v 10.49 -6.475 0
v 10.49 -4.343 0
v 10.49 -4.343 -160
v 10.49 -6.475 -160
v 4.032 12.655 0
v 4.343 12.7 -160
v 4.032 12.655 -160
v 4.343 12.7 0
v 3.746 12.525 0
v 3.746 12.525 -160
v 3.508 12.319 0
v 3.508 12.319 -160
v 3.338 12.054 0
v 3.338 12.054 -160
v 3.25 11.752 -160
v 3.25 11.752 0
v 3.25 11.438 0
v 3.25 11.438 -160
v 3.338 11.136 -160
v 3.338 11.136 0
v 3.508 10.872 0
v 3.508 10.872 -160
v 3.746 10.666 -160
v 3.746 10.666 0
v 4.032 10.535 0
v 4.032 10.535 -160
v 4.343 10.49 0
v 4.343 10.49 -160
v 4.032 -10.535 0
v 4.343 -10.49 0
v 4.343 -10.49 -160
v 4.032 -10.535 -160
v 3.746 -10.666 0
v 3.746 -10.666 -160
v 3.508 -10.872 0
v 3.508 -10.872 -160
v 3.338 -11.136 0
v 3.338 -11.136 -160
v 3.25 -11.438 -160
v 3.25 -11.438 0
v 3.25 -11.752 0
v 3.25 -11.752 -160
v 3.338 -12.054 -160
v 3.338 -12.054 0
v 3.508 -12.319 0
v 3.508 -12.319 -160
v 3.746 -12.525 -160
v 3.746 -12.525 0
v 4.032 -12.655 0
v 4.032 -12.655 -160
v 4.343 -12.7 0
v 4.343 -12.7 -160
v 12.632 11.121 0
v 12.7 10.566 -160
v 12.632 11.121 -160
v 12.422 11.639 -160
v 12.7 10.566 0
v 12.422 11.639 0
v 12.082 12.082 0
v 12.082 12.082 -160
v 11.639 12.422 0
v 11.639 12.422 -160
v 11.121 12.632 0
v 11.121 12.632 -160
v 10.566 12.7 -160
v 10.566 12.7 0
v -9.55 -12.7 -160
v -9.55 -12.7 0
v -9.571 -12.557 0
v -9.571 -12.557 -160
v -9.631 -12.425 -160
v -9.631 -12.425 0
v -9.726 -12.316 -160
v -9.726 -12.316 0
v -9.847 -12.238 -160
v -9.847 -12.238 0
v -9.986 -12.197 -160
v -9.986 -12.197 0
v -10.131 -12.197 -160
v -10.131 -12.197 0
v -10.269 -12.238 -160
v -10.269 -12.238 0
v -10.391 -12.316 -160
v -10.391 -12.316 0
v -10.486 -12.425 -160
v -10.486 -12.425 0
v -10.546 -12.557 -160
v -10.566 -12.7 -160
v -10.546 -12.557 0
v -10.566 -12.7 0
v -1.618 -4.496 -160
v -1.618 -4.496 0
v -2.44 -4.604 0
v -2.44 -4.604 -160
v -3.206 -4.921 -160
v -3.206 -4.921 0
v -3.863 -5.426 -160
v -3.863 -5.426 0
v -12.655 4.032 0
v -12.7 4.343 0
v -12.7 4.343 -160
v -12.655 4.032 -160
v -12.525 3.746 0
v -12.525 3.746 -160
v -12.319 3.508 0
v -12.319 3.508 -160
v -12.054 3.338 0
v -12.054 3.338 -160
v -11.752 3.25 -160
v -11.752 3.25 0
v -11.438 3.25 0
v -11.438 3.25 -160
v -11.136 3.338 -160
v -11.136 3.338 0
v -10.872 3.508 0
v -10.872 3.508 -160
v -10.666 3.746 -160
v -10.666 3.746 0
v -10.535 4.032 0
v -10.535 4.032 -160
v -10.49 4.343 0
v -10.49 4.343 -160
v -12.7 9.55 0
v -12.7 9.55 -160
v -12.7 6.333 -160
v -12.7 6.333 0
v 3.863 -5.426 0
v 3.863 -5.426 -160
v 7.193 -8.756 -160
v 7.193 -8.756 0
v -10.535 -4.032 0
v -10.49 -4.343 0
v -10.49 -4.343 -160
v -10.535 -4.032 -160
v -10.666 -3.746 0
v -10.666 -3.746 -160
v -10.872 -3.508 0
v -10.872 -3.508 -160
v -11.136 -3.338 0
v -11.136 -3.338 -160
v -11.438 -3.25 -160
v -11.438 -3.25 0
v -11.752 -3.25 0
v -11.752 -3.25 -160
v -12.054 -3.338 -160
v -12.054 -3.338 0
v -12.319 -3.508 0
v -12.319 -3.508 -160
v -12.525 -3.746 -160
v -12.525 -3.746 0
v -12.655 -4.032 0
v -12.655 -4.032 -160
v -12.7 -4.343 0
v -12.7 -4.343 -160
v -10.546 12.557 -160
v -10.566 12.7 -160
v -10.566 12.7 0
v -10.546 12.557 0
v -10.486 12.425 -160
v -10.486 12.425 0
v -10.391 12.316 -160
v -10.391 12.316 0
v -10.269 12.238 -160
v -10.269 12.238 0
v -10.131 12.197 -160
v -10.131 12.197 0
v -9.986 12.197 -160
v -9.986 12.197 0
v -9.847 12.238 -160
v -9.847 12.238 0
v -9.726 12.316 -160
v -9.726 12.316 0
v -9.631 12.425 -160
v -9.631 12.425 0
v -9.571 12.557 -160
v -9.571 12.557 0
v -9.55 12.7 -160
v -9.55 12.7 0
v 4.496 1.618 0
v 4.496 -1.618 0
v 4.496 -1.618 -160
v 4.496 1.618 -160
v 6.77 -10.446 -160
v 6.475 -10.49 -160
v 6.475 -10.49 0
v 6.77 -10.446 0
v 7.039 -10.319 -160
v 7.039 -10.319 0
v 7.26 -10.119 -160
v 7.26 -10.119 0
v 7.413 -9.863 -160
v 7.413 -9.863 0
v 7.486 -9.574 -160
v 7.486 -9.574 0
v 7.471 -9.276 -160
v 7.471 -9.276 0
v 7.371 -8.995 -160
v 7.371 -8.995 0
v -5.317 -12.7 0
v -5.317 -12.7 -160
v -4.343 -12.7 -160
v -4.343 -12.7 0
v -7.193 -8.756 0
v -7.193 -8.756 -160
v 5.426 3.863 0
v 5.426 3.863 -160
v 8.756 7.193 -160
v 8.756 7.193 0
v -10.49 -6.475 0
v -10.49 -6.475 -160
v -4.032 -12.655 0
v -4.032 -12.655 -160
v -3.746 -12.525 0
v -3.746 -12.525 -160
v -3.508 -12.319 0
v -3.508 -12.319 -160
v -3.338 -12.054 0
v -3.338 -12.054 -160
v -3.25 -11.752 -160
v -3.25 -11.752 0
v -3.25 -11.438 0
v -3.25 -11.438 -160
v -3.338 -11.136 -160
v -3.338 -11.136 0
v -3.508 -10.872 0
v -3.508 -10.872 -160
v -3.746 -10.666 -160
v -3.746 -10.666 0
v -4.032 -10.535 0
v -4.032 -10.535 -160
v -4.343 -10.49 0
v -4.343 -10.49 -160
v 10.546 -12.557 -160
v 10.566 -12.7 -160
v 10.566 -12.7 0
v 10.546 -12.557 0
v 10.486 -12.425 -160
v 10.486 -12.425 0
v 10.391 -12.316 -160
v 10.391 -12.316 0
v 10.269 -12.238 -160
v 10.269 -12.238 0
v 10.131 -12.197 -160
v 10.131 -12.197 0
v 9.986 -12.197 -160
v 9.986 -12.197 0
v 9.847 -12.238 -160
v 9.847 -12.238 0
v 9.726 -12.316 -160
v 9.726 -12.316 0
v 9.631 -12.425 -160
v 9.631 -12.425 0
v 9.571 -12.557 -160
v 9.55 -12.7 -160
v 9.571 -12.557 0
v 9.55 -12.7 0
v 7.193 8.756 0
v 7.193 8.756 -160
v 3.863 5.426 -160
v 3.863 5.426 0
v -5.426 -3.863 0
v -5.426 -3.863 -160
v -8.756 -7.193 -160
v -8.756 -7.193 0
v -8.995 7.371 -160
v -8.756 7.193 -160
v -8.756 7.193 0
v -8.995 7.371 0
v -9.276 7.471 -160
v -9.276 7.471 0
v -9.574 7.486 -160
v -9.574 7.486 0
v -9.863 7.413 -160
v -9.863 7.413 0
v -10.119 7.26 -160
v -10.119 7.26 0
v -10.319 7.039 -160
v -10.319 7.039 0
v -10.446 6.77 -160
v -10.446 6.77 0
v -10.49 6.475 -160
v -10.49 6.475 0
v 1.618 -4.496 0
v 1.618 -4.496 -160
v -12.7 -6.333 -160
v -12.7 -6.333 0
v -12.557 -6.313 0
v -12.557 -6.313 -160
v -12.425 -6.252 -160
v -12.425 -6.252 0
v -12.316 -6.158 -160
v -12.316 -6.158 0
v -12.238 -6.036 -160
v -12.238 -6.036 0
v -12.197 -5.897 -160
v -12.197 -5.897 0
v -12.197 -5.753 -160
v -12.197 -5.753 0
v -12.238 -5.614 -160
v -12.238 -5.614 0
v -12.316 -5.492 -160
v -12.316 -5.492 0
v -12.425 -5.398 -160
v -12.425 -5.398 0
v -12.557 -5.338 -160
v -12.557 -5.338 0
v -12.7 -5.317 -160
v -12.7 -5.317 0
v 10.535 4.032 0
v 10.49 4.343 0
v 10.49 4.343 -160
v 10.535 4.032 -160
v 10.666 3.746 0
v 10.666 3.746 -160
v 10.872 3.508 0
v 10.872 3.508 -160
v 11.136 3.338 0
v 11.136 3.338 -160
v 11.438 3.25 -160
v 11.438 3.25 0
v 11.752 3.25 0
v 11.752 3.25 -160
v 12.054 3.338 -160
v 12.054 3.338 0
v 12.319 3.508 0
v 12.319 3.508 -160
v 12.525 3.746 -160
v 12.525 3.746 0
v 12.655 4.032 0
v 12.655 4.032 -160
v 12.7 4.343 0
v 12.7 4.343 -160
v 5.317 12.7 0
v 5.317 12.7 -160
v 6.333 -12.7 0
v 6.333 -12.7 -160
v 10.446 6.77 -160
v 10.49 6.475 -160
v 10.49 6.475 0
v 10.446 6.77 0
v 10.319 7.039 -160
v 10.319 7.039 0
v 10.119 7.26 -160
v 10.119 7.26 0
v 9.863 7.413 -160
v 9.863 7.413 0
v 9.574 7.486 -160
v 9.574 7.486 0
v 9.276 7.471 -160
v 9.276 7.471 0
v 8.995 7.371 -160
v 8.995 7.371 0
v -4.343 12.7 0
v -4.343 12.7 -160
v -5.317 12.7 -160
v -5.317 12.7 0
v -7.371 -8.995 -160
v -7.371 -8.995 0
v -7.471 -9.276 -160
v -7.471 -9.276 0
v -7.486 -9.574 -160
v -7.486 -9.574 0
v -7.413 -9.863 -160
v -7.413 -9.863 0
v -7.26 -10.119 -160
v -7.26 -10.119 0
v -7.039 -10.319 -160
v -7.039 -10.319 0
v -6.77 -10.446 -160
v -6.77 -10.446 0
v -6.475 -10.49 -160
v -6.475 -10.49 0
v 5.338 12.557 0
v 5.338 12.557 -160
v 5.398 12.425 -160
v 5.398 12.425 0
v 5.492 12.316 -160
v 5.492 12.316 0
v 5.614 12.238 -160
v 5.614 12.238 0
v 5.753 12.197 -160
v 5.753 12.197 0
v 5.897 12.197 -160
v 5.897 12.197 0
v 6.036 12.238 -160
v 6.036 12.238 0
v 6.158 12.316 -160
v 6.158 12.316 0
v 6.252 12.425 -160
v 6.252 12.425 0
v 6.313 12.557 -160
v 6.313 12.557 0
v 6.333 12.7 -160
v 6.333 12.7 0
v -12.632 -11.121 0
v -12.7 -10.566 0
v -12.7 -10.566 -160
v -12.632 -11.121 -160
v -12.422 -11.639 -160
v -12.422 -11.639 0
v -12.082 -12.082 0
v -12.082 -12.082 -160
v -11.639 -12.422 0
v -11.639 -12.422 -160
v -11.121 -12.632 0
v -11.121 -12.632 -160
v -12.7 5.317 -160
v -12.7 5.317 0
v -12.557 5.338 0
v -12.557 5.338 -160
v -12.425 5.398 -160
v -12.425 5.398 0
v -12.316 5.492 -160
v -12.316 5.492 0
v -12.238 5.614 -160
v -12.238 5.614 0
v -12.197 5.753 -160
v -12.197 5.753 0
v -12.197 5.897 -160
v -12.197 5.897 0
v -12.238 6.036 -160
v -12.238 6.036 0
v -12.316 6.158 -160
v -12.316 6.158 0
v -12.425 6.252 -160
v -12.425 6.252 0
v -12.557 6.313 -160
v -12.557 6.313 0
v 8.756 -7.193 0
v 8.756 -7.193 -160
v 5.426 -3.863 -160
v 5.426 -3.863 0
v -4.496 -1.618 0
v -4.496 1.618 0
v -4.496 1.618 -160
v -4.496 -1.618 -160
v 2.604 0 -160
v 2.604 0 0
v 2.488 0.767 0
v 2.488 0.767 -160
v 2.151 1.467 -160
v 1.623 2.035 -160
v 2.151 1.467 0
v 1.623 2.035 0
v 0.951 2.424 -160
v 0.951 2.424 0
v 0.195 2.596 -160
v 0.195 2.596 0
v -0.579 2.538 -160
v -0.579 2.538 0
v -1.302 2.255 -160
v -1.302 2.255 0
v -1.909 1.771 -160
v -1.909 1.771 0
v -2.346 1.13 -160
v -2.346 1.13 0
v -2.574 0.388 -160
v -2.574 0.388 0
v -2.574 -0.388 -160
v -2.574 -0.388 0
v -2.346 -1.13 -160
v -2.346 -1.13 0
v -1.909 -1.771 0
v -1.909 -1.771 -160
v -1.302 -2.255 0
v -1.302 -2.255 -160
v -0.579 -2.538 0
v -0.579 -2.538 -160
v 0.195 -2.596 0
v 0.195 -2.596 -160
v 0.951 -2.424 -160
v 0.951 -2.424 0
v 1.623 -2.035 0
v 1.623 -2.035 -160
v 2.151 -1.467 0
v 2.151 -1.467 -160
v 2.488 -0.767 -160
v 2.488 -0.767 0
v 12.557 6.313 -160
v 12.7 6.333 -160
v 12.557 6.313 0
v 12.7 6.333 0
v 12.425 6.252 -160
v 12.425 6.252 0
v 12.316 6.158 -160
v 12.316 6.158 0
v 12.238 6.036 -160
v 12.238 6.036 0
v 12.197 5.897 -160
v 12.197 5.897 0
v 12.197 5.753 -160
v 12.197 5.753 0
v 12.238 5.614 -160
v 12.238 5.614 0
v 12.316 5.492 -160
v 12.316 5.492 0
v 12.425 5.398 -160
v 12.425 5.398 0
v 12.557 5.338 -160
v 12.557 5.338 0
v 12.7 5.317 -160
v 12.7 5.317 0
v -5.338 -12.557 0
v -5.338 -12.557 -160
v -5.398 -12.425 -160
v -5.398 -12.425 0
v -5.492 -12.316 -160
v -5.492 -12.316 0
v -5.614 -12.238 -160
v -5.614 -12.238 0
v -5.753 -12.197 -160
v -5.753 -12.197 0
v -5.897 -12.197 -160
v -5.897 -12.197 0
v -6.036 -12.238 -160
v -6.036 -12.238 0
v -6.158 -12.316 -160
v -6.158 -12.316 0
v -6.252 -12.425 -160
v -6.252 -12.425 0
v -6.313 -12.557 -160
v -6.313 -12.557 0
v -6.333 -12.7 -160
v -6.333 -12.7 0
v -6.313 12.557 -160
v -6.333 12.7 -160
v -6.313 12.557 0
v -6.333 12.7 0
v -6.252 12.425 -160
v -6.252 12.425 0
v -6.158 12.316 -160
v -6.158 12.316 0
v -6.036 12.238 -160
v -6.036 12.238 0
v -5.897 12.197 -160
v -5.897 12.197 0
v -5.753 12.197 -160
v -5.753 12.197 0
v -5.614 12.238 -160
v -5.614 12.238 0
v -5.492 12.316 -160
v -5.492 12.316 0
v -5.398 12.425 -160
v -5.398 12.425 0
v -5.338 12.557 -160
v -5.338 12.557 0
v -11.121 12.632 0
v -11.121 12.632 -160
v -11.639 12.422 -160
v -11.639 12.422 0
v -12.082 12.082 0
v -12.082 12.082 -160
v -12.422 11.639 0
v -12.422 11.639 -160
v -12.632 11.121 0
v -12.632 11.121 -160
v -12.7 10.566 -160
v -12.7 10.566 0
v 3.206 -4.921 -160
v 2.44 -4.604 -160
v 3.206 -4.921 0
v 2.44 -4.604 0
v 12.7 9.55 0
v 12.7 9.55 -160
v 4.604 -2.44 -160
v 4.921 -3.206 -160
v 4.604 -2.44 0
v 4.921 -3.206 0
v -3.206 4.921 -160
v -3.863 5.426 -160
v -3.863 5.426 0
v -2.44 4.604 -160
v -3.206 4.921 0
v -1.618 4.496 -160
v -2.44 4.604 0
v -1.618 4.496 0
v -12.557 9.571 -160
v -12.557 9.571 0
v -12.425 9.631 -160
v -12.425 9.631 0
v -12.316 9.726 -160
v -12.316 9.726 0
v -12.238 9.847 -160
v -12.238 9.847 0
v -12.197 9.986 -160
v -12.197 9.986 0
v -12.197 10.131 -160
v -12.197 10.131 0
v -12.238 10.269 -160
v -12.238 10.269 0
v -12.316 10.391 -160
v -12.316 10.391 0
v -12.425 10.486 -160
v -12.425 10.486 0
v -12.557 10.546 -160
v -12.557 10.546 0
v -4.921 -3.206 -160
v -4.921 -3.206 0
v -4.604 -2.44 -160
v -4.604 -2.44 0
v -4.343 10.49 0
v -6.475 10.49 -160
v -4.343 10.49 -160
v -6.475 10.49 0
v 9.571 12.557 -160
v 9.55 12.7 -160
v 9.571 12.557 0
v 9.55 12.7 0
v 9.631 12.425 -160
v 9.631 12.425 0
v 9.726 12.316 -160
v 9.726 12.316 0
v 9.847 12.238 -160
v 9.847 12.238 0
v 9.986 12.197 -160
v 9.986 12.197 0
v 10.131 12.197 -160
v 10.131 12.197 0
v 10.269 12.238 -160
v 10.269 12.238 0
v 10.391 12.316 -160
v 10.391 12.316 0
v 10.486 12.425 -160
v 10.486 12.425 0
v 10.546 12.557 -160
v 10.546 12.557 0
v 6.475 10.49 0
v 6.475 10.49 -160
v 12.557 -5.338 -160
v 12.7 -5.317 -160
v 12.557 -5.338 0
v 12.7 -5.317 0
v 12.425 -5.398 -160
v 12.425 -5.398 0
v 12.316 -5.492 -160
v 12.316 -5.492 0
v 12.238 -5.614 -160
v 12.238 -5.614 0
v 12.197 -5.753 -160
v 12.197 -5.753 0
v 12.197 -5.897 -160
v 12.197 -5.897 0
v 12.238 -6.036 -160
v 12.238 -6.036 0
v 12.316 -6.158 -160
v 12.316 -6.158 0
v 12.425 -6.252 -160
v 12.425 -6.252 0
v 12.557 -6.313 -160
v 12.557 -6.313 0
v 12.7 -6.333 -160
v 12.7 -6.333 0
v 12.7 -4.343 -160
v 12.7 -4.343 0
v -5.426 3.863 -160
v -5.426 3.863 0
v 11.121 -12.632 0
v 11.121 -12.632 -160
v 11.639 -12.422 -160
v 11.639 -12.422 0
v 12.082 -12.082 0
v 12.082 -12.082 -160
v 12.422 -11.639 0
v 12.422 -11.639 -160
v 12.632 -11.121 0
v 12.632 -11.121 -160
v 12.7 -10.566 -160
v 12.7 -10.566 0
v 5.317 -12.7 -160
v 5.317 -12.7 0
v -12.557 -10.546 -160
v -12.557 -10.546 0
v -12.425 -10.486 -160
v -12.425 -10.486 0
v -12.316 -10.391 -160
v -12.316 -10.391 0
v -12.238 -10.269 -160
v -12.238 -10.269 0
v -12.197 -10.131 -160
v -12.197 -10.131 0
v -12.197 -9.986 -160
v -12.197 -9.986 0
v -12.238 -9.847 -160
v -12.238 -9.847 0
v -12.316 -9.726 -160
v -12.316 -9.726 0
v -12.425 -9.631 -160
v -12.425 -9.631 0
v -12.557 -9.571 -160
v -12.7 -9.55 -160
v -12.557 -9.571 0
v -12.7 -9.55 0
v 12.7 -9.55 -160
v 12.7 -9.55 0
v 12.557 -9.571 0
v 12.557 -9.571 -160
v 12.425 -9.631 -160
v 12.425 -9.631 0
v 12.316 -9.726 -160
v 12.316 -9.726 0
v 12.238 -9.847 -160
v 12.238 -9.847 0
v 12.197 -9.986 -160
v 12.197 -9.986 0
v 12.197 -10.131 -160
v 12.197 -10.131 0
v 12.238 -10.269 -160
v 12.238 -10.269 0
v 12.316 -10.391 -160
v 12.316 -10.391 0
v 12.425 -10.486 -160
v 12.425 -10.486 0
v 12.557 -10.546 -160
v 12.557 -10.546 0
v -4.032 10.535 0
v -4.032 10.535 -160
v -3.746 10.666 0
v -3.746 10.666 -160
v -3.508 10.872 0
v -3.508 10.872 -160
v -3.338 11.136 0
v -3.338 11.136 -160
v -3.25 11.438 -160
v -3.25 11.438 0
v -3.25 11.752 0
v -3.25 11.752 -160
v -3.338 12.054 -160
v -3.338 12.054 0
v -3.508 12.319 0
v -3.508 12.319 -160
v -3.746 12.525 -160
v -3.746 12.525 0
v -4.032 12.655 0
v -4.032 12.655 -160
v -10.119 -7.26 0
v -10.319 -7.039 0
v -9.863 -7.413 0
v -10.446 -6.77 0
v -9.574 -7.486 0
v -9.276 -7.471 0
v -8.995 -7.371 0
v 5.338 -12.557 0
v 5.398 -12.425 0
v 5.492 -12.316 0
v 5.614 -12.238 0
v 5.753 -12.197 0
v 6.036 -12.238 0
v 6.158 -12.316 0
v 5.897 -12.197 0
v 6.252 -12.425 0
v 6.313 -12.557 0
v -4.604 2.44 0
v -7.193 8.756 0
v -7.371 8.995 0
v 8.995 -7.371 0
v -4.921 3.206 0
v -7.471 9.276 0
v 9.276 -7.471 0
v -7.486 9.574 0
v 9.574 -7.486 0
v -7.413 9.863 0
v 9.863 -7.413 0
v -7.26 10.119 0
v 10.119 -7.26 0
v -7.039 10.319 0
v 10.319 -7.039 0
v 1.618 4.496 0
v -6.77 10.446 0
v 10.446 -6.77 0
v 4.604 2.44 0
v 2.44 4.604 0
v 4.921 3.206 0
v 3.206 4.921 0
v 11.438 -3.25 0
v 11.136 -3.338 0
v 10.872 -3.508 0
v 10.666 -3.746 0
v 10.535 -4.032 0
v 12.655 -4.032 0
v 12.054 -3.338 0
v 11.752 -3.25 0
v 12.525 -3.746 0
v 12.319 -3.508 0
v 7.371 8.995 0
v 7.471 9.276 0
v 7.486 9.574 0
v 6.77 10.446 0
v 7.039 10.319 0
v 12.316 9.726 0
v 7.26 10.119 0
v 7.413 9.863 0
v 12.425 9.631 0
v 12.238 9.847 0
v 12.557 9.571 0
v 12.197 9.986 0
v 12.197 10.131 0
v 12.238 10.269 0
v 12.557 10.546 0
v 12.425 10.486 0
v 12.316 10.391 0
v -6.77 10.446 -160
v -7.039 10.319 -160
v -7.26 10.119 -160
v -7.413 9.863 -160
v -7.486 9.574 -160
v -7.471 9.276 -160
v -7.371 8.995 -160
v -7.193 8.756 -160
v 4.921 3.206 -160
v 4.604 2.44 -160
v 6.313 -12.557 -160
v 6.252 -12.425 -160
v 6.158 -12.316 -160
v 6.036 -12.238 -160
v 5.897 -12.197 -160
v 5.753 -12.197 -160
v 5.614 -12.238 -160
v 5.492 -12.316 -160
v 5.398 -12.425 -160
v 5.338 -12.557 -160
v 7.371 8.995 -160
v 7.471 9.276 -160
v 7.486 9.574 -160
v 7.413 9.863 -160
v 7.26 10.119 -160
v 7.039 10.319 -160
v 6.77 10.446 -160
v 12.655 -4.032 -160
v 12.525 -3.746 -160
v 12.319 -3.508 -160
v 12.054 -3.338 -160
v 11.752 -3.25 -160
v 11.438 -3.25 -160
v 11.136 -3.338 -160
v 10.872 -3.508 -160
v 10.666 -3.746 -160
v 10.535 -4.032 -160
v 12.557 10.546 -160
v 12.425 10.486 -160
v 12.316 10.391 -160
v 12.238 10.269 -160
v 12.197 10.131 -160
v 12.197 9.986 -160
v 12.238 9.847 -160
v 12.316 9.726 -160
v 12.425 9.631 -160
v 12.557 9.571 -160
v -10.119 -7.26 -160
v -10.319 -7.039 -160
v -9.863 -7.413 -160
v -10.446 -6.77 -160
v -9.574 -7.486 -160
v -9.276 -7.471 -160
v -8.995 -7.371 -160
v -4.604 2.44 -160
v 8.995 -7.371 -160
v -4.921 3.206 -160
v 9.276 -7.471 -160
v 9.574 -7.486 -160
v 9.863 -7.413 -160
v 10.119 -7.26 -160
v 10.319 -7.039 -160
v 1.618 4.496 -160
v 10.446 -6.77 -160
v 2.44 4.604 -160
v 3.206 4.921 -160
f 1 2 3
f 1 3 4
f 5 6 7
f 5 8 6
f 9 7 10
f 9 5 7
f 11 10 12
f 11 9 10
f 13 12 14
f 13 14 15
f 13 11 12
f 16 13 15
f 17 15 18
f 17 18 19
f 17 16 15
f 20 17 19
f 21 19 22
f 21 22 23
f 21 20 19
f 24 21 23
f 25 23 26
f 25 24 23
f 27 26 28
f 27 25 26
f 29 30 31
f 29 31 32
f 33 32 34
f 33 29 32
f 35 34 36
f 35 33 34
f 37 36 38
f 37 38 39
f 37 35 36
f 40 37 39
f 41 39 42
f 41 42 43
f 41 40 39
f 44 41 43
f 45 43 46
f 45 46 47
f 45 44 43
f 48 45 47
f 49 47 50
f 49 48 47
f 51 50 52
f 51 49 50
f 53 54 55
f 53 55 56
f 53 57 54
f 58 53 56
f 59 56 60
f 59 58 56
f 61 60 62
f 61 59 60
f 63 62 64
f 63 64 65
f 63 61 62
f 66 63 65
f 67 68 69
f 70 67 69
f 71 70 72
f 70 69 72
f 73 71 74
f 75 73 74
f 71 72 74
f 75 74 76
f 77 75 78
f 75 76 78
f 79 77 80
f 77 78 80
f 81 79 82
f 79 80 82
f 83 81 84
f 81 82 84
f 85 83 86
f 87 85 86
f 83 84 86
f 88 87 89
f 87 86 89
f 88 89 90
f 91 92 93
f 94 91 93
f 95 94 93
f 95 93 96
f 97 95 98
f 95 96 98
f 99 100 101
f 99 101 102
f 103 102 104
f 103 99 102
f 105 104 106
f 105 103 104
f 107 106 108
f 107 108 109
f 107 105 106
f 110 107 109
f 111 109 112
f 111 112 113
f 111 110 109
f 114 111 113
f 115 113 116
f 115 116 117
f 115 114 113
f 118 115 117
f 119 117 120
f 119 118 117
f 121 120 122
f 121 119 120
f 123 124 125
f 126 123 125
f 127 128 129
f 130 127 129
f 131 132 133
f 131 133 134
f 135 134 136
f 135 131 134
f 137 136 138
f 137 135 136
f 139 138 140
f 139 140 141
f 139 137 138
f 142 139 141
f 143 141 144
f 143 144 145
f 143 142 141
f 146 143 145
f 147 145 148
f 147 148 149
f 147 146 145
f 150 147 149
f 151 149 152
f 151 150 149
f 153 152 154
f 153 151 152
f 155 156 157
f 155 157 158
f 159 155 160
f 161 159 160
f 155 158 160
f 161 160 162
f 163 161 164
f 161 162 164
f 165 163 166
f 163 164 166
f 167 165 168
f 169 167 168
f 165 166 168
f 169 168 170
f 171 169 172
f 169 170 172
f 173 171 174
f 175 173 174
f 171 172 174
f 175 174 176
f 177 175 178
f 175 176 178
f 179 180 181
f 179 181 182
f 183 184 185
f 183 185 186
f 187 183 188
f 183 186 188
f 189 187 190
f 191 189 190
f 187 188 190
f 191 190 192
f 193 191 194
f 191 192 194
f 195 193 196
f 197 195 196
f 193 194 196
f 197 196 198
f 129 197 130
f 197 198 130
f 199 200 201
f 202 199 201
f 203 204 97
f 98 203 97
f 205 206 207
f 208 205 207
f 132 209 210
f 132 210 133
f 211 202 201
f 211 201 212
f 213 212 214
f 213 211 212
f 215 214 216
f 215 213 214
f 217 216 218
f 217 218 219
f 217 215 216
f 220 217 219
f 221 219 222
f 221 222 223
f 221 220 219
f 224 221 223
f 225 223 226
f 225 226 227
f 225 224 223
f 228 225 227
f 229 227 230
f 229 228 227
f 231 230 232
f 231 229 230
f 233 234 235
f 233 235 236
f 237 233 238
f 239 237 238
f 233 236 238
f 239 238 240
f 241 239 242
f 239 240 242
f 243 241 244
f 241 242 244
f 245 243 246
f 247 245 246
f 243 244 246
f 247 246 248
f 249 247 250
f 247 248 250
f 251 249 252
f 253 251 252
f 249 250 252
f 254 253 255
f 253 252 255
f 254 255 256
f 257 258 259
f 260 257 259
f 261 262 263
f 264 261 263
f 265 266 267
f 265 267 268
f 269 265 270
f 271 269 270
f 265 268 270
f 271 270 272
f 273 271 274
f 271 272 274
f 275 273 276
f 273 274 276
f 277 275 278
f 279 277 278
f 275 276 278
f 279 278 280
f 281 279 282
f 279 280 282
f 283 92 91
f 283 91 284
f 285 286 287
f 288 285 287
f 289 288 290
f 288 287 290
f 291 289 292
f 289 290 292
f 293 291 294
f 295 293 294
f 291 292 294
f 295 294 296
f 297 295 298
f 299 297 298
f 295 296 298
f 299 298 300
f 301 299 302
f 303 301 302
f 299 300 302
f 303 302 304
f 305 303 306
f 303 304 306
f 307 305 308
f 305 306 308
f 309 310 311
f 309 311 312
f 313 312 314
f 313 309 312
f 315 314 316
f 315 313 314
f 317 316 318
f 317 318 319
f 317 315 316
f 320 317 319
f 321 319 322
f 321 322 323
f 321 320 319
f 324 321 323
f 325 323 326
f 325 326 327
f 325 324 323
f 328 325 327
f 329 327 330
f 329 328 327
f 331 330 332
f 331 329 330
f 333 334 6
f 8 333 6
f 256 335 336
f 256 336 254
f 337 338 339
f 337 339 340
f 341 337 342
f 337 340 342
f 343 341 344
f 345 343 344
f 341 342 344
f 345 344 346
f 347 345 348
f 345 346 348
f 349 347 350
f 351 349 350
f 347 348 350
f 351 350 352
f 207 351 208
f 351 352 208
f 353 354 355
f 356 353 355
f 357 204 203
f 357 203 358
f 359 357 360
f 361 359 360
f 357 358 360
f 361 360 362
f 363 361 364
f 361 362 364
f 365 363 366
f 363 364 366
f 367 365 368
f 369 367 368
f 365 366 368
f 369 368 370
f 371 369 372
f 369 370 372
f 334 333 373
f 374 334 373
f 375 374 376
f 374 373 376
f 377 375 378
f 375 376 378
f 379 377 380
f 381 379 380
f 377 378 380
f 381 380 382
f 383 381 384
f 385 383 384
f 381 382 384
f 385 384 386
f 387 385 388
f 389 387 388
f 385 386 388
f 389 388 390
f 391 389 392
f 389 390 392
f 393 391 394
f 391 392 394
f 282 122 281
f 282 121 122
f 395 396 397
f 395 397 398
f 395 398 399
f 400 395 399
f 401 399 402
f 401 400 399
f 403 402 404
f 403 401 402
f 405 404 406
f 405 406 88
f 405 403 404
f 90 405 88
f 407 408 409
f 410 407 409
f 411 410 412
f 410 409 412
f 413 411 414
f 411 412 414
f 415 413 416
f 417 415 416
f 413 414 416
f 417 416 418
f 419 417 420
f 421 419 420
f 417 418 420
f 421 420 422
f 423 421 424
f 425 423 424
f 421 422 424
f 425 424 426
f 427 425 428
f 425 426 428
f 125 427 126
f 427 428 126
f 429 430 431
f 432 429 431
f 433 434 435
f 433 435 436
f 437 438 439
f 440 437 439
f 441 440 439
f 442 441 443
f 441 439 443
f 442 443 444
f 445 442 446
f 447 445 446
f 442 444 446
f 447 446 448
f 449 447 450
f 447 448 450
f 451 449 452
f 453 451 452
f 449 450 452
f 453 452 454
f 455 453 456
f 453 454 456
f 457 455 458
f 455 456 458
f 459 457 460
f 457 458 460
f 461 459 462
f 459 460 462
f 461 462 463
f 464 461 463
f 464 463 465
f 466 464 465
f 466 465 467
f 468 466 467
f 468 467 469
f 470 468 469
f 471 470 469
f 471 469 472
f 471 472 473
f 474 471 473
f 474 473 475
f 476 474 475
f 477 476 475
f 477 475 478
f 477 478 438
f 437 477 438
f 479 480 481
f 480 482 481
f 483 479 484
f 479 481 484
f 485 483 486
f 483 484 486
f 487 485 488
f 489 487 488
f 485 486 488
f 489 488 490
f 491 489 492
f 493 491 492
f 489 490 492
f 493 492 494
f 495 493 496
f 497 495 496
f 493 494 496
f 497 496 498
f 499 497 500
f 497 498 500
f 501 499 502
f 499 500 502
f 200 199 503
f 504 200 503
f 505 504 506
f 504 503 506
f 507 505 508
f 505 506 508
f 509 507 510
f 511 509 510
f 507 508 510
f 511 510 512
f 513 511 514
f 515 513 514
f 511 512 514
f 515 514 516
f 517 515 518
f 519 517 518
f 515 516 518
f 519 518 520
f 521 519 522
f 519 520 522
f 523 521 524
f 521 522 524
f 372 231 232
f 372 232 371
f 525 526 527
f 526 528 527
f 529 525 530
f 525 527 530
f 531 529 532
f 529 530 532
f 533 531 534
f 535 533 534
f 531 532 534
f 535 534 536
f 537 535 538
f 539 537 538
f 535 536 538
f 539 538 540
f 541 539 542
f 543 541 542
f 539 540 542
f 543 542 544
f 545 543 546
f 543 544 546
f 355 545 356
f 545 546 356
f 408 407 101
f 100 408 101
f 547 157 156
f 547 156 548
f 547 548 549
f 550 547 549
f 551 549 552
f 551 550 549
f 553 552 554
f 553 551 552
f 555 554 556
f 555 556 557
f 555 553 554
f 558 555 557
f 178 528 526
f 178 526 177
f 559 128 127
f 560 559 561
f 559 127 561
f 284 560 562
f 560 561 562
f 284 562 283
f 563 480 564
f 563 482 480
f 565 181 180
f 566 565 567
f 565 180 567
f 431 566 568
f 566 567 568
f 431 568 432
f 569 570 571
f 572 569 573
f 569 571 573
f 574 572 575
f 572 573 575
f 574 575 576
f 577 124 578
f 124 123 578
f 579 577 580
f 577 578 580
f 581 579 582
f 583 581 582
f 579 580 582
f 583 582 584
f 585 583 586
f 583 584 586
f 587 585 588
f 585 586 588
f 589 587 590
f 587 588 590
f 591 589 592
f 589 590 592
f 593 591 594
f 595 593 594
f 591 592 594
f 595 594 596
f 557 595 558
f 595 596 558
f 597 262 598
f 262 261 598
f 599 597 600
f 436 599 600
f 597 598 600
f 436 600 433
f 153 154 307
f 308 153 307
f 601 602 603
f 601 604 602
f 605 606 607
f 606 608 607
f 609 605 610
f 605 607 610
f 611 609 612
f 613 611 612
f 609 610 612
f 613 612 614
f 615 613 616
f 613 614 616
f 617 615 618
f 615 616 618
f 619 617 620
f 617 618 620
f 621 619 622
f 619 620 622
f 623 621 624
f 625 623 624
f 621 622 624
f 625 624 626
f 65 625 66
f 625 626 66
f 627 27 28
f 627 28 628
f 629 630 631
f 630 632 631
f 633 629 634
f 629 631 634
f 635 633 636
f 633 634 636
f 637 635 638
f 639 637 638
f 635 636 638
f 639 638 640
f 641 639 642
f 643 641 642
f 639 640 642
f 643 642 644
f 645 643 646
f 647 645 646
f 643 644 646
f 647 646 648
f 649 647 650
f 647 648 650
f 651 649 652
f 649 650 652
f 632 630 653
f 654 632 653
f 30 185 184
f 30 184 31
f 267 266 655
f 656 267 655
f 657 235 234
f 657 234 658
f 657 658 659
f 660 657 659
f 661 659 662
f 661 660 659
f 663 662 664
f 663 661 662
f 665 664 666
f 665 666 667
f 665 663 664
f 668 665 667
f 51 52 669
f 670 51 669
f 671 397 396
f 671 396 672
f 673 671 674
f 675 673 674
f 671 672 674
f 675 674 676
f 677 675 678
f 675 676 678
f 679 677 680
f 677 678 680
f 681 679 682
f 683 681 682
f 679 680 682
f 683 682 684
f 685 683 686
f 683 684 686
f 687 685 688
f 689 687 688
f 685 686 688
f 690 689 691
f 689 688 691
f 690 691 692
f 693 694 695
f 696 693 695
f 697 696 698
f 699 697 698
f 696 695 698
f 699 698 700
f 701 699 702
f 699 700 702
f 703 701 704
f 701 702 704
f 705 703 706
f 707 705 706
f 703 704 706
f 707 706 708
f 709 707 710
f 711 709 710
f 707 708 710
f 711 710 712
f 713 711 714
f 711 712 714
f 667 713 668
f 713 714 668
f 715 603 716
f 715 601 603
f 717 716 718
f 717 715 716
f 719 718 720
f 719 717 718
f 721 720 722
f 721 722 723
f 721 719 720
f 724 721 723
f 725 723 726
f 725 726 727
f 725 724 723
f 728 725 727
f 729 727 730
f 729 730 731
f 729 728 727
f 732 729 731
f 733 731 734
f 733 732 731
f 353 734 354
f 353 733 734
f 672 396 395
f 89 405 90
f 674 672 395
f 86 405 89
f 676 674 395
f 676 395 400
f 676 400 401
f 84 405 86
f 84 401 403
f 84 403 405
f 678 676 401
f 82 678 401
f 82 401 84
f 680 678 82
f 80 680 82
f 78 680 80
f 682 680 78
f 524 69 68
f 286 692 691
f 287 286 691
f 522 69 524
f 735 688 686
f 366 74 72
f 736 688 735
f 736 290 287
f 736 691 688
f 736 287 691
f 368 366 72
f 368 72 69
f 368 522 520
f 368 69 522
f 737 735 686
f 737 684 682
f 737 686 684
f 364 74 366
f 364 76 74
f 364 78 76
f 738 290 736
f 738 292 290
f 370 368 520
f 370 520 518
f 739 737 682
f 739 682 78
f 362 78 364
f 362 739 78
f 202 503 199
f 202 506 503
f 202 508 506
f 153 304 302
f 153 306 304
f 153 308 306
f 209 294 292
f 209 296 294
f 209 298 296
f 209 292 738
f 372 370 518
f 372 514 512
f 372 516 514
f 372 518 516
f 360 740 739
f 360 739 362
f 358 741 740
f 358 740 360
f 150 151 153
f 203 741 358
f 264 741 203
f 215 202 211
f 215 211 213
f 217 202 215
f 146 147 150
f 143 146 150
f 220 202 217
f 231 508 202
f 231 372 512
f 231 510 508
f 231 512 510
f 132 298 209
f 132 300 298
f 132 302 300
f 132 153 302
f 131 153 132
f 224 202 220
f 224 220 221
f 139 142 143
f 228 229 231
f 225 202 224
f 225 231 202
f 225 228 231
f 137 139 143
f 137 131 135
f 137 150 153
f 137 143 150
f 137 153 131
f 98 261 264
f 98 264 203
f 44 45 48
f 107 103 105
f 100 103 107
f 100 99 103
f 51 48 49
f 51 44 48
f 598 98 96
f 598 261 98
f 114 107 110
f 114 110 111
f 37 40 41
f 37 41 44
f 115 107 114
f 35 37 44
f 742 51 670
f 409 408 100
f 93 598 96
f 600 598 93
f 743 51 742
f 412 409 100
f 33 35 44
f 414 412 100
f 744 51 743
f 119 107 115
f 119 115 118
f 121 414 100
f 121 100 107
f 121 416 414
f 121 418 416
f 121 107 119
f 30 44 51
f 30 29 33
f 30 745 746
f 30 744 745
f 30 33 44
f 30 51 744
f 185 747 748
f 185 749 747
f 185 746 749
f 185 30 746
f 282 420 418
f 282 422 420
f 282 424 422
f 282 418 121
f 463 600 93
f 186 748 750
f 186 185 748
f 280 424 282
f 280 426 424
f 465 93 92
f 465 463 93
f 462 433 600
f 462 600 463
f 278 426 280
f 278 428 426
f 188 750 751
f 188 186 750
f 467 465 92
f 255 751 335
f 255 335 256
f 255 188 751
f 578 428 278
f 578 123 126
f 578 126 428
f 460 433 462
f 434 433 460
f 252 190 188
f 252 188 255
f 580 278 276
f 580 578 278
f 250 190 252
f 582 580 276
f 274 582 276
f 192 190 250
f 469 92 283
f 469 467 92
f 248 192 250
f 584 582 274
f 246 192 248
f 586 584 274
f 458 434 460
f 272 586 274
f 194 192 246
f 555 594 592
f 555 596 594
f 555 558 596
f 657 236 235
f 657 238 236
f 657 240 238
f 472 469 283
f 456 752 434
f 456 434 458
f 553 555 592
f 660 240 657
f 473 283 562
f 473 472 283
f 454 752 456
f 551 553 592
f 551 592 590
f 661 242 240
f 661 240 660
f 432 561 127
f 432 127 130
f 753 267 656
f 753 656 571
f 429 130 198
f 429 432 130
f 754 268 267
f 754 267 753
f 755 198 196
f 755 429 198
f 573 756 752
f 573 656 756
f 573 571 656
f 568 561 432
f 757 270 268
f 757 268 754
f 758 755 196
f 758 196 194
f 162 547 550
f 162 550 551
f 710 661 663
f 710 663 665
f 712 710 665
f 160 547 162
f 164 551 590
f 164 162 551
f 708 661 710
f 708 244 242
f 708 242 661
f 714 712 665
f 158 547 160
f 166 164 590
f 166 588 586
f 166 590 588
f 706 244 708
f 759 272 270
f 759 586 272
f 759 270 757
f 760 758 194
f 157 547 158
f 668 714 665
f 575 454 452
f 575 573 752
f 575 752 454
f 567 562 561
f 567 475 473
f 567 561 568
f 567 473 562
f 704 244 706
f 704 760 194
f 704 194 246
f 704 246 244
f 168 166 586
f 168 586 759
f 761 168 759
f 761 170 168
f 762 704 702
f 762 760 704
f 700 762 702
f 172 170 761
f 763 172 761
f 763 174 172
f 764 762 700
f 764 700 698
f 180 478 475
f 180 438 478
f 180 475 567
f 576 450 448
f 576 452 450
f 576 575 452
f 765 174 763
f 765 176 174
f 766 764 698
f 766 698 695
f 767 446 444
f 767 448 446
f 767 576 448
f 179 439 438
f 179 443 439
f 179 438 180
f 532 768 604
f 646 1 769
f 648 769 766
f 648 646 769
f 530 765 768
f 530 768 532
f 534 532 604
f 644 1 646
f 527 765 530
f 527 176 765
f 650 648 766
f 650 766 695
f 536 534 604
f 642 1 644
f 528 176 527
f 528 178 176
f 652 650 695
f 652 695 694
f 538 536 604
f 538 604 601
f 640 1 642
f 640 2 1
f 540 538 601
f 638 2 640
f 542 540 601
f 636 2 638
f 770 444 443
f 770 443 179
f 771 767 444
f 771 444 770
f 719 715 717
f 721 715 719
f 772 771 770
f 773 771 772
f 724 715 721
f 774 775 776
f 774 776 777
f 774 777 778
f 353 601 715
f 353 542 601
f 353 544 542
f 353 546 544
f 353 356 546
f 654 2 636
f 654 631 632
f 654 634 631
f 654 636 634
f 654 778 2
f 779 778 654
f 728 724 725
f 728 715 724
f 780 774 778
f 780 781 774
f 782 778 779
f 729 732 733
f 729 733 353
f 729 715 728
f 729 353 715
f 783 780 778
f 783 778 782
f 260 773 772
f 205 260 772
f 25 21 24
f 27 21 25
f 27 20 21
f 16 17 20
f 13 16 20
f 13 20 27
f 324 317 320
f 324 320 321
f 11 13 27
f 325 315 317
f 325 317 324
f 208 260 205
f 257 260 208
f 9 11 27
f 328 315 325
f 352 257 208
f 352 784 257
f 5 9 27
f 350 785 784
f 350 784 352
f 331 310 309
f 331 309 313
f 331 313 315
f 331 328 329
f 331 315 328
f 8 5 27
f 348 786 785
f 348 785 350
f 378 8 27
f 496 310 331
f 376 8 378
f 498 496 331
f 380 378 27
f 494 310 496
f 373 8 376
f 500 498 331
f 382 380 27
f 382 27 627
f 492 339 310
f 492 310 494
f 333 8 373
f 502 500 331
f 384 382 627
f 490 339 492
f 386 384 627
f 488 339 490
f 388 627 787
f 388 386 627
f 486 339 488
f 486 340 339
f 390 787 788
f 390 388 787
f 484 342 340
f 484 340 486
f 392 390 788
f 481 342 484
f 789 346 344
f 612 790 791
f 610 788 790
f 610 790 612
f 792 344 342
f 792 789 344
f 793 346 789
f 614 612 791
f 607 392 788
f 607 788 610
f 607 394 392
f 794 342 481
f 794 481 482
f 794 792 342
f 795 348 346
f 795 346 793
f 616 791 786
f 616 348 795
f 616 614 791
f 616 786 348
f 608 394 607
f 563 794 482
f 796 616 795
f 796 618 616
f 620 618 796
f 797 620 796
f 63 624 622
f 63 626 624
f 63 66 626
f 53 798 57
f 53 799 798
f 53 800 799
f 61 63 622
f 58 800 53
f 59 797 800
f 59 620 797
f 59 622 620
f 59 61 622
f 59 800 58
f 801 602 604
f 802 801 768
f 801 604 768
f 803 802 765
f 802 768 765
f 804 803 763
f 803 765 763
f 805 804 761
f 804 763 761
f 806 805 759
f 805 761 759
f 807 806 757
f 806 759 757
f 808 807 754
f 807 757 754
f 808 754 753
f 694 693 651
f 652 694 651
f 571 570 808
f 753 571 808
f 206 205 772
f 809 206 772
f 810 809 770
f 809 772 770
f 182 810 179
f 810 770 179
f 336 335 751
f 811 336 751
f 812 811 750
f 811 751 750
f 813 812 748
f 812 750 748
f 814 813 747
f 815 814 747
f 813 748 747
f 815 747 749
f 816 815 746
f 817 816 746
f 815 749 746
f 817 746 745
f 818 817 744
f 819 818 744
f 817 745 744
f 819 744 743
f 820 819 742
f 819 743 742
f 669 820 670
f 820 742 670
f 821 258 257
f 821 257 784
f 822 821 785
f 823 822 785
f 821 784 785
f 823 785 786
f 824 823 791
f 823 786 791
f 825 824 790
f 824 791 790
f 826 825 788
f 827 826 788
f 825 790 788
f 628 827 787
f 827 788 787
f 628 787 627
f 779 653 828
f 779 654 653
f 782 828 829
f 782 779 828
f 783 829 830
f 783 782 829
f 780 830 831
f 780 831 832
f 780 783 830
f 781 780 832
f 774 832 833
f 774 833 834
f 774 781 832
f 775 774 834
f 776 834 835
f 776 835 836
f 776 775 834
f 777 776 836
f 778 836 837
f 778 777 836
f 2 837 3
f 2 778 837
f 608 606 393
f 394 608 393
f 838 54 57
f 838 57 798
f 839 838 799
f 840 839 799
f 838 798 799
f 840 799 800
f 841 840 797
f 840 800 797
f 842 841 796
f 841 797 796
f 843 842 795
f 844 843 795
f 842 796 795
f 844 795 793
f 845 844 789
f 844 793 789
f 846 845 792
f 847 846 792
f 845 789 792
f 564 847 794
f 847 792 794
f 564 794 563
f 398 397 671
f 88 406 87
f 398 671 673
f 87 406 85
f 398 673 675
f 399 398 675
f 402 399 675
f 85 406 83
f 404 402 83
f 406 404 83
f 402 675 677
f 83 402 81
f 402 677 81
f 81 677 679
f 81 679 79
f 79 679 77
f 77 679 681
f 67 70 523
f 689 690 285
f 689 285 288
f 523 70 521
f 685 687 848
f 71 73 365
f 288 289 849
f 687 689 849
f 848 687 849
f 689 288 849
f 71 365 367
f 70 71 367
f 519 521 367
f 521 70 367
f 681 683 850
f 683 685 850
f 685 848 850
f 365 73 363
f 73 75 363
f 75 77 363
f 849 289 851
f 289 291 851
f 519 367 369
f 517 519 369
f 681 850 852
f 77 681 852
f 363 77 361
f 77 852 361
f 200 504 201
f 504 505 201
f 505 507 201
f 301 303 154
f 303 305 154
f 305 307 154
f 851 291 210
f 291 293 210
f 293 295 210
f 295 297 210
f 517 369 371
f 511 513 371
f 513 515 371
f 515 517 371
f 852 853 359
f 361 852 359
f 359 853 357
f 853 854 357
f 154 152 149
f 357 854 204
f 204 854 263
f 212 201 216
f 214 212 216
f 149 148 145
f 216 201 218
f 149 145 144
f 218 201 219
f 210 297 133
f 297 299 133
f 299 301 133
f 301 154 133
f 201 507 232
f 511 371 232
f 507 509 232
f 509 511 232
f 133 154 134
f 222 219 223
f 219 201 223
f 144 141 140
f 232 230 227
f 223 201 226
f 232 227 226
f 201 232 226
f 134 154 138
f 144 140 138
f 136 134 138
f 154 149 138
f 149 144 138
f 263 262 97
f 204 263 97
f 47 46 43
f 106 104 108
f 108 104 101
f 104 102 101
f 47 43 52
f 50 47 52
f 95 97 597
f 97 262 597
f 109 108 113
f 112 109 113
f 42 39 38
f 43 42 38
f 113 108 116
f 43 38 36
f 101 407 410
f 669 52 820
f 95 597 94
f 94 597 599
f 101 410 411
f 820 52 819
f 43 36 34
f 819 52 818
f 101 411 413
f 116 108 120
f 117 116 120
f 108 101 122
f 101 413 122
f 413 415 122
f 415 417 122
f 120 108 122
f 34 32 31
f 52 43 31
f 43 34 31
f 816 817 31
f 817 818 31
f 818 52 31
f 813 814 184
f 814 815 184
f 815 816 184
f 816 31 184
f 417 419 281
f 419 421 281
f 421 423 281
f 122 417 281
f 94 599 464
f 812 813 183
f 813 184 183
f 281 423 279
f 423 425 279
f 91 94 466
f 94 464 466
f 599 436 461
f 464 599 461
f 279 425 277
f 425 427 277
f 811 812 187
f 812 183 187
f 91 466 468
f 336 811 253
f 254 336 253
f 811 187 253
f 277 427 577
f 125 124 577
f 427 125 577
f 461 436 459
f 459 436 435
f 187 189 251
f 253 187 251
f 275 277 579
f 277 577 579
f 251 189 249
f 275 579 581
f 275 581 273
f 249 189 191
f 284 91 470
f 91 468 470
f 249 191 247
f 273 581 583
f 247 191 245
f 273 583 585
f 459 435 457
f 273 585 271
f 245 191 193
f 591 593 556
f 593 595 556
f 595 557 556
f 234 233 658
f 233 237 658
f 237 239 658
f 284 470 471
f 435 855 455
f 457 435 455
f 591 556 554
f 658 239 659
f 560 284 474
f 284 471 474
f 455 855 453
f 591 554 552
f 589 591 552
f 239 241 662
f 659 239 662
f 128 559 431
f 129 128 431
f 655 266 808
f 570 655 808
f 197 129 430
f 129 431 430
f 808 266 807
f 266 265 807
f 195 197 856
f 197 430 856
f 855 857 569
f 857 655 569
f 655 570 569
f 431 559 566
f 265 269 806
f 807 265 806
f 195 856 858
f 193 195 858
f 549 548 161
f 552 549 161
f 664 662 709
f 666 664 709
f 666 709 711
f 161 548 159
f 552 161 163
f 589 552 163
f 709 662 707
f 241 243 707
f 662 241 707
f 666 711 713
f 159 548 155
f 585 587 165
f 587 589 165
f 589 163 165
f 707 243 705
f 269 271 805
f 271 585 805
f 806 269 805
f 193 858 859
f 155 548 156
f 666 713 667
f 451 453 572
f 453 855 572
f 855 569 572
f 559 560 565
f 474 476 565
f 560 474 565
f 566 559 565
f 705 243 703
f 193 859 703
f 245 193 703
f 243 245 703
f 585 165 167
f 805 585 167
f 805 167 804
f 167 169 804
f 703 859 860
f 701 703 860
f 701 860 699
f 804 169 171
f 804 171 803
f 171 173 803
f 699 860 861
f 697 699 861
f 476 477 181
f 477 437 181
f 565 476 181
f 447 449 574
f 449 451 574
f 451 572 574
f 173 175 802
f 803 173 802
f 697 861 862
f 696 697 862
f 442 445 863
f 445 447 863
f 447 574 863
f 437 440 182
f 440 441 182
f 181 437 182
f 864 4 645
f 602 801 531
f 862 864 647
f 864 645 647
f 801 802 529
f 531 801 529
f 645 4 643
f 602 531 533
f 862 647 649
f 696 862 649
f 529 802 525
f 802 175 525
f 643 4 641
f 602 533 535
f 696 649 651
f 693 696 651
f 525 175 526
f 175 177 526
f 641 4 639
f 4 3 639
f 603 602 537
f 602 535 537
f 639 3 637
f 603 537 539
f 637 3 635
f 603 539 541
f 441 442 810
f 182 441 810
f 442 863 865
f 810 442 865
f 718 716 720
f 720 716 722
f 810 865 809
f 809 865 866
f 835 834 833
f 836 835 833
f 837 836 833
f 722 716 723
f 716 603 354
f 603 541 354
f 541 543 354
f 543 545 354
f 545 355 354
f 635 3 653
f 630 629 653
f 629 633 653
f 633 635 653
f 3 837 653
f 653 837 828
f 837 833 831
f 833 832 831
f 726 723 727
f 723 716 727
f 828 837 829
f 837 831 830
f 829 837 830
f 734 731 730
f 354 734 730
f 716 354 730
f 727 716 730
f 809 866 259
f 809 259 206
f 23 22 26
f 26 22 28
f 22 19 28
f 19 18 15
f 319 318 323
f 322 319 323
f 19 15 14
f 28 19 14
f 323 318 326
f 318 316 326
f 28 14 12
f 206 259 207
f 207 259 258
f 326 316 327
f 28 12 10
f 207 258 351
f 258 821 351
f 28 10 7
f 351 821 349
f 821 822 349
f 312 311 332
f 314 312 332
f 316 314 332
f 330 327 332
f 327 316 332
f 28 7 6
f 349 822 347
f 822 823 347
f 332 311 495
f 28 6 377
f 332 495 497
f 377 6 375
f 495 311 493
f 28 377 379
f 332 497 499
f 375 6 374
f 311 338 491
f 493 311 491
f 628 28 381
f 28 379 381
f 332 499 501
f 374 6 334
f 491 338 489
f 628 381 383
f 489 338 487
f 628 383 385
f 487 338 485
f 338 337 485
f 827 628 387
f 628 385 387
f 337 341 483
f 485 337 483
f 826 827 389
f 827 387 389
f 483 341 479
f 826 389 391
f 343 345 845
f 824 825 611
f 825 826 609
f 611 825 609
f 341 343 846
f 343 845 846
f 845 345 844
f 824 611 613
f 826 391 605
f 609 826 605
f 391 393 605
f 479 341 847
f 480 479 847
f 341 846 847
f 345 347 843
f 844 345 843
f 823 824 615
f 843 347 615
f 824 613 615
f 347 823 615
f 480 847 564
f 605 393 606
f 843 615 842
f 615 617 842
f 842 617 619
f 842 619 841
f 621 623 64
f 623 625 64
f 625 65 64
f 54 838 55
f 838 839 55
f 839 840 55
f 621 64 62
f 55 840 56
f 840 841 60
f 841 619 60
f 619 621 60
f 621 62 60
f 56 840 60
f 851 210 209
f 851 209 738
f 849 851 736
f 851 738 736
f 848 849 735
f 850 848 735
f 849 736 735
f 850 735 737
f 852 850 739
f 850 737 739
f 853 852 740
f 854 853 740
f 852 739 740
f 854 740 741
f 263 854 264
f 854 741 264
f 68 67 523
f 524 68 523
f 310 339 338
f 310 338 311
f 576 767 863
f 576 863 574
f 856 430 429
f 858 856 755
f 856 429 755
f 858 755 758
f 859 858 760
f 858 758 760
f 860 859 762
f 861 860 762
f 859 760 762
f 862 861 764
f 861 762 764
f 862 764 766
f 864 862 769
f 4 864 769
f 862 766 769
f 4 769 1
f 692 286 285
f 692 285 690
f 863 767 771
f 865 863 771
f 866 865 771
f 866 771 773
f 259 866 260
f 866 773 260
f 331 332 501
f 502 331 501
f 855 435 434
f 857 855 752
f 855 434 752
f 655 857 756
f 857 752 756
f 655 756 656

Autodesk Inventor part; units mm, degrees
sketch "Sketch_1" plane through (0, 0, 0) normal (0, 0, 1) x (1, 0, 0)
  arc A0 (-12.6998, -10.5664) -> (-10.5664, -12.6998) centre (-10.5918, -10.5918) ccw
  arc A1 (-9.5504, -12.7) -> (-10.5664, -12.6998) centre (-10.0584, -12.7) ccw
  line L0 (-9.5504, -12.7) -> (-6.3331, -12.7)
  arc A2 (-5.3171, -12.7) -> (-6.3331, -12.7) centre (-5.8251, -12.7) ccw
  line L1 (-5.3171, -12.7) -> (-4.3434, -12.7)
  arc A3 (-4.3434, -12.7) -> (-4.3434, -10.4902) centre (-4.3434, -11.5951) ccw
  line L2 (-4.3434, -10.4902) -> (-6.4748, -10.4902)
  arc A4 (-7.1932, -8.7558) -> (-6.4748, -10.4902) centre (-6.4748, -9.4742) ccw
  line L3 (-7.1932, -8.7558) -> (-3.8632, -5.4257)
  arc A5 (-1.6181, -4.4958) -> (-3.8632, -5.4257) centre (-1.6181, -7.6708) ccw
  line L4 (-1.6181, -4.4958) -> (1.6181, -4.4958)
  arc A6 (3.8632, -5.4257) -> (1.6181, -4.4958) centre (1.6181, -7.6708) ccw
  line L5 (3.8632, -5.4257) -> (7.1932, -8.7558)
  arc A7 (6.4748, -10.4902) -> (7.1932, -8.7558) centre (6.4748, -9.4742) ccw
  line L6 (6.4748, -10.4902) -> (4.3434, -10.4902)
  arc A8 (4.3434, -10.4902) -> (4.3434, -12.7) centre (4.3434, -11.5951) ccw
  line L7 (4.3434, -12.7) -> (5.3171, -12.7)
  arc A9 (6.3331, -12.7) -> (5.3171, -12.7) centre (5.8251, -12.7) ccw
  line L8 (6.3331, -12.7) -> (9.5504, -12.7)
  arc A10 (10.5664, -12.6998) -> (9.5504, -12.7) centre (10.0584, -12.7) ccw
  arc A11 (10.5664, -12.6998) -> (12.6998, -10.5664) centre (10.5918, -10.5918) ccw
  arc A12 (12.7, -9.5504) -> (12.6998, -10.5664) centre (12.7, -10.0584) ccw
  line L9 (12.7, -9.5504) -> (12.7, -6.3331)
  arc A13 (12.7, -5.3171) -> (12.7, -6.3331) centre (12.7, -5.8251) ccw
  line L10 (12.7, -5.3171) -> (12.7, -4.3434)
  arc A14 (12.7, -4.3434) -> (10.4902, -4.3434) centre (11.5951, -4.3434) ccw
  line L11 (10.4902, -4.3434) -> (10.4902, -6.4748)
  arc A15 (8.7558, -7.1932) -> (10.4902, -6.4748) centre (9.4742, -6.4748) ccw
  line L12 (8.7558, -7.1932) -> (5.4257, -3.8632)
  arc A16 (4.4958, -1.6181) -> (5.4257, -3.8632) centre (7.6708, -1.6181) ccw
  line L13 (4.4958, -1.6181) -> (4.4958, 1.6181)
  arc A17 (5.4257, 3.8632) -> (4.4958, 1.6181) centre (7.6708, 1.6181) ccw
  line L14 (5.4257, 3.8632) -> (8.7558, 7.1932)
  arc A18 (10.4902, 6.4748) -> (8.7558, 7.1932) centre (9.4742, 6.4748) ccw
  line L15 (10.4902, 6.4748) -> (10.4902, 4.3434)
  arc A19 (10.4902, 4.3434) -> (12.7, 4.3434) centre (11.5951, 4.3434) ccw
  line L16 (12.7, 4.3434) -> (12.7, 5.3171)
  arc A20 (12.7, 6.3331) -> (12.7, 5.3171) centre (12.7, 5.8251) ccw
  line L17 (12.7, 6.3331) -> (12.7, 9.5504)
  arc A21 (12.6998, 10.5664) -> (12.7, 9.5504) centre (12.7, 10.0584) ccw
  arc A22 (12.6998, 10.5664) -> (10.5664, 12.6998) centre (10.5918, 10.5918) ccw
  arc A23 (9.5504, 12.7) -> (10.5664, 12.6998) centre (10.0584, 12.7) ccw
  line L18 (9.5504, 12.7) -> (6.3331, 12.7)
  arc A24 (5.3171, 12.7) -> (6.3331, 12.7) centre (5.8251, 12.7) ccw
  line L19 (5.3171, 12.7) -> (4.3434, 12.7)
  arc A25 (4.3434, 12.7) -> (4.3434, 10.4902) centre (4.3434, 11.5951) ccw
  line L20 (4.3434, 10.4902) -> (6.4748, 10.4902)
  arc A26 (7.1932, 8.7558) -> (6.4748, 10.4902) centre (6.4748, 9.4742) ccw
  line L21 (7.1932, 8.7558) -> (3.8632, 5.4257)
  arc A27 (1.6181, 4.4958) -> (3.8632, 5.4257) centre (1.6181, 7.6708) ccw
  line L22 (1.6181, 4.4958) -> (-1.6181, 4.4958)
  arc A28 (-3.8632, 5.4257) -> (-1.6181, 4.4958) centre (-1.6181, 7.6708) ccw
  line L23 (-3.8632, 5.4257) -> (-7.1932, 8.7558)
  arc A29 (-6.4748, 10.4902) -> (-7.1932, 8.7558) centre (-6.4748, 9.4742) ccw
  line L24 (-6.4748, 10.4902) -> (-4.3434, 10.4902)
  arc A30 (-4.3434, 10.4902) -> (-4.3434, 12.7) centre (-4.3434, 11.5951) ccw
  line L25 (-4.3434, 12.7) -> (-5.3171, 12.7)
  arc A31 (-6.3331, 12.7) -> (-5.3171, 12.7) centre (-5.8251, 12.7) ccw
  line L26 (-6.3331, 12.7) -> (-9.5504, 12.7)
  arc A32 (-10.5664, 12.6998) -> (-9.5504, 12.7) centre (-10.0584, 12.7) ccw
  arc A33 (-10.5664, 12.6998) -> (-12.6998, 10.5664) centre (-10.5918, 10.5918) ccw
  arc A34 (-12.7, 9.5504) -> (-12.6998, 10.5664) centre (-12.7, 10.0584) ccw
  line L27 (-12.7, 9.5504) -> (-12.7, 6.3331)
  arc A35 (-12.7, 5.3171) -> (-12.7, 6.3331) centre (-12.7, 5.8251) ccw
  line L28 (-12.7, 5.3171) -> (-12.7, 4.3434)
  arc A36 (-12.7, 4.3434) -> (-10.4902, 4.3434) centre (-11.5951, 4.3434) ccw
  line L29 (-10.4902, 4.3434) -> (-10.4902, 6.4748)
  arc A37 (-8.7558, 7.1932) -> (-10.4902, 6.4748) centre (-9.4742, 6.4748) ccw
  line L30 (-8.7558, 7.1932) -> (-5.4257, 3.8632)
  arc A38 (-4.4958, 1.6181) -> (-5.4257, 3.8632) centre (-7.6708, 1.6181) ccw
  line L31 (-4.4958, 1.6181) -> (-4.4958, -1.6181)
  arc A39 (-5.4257, -3.8632) -> (-4.4958, -1.6181) centre (-7.6708, -1.6181) ccw
  line L32 (-5.4257, -3.8632) -> (-8.7558, -7.1932)
  arc A40 (-10.4902, -6.4748) -> (-8.7558, -7.1932) centre (-9.4742, -6.4748) ccw
  line L33 (-10.4902, -6.4748) -> (-10.4902, -4.3434)
  arc A41 (-10.4902, -4.3434) -> (-12.7, -4.3434) centre (-11.5951, -4.3434) ccw
  line L34 (-12.7, -4.3434) -> (-12.7, -5.3171)
  arc A42 (-12.7, -6.3331) -> (-12.7, -5.3171) centre (-12.7, -5.8251) ccw
  line L35 (-12.7, -6.3331) -> (-12.7, -9.5504)
  arc A43 (-12.6998, -10.5664) -> (-12.7, -9.5504) centre (-12.7, -10.0584) ccw
  circle A44 centre (0, 0) radius 2.6035
extrude "Extrusion1" add sketch "Sketch_1" against normal blind 160
ref_plane "b1_XY" through (-12.7, 0, -12.7) normal (1, 0, 0) x (0, 0, -1)
ref_plane "b1_YZ" through (-12.7, 0, -12.7) normal (0, 0, -1) x (0, 1, 0)
ref_plane "b1_ZX" through (-12.7, 0, -12.7) normal (0, 1, 0) x (1, 0, 0)
ref_plane "b2_XY" through (12.7, 0, -12.7) normal (1, 0, 0) x (0, 0, -1)
ref_plane "b2_YZ" through (12.7, 0, -12.7) normal (0, 0, -1) x (0, 1, 0)
ref_plane "b2_ZX" through (12.7, 0, -12.7) normal (0, 1, 0) x (1, 0, 0)
ref_plane "profile1010_XY" through (0, 0, -12.7) normal (0, 0, 1) x (1, 0, 0)
ref_plane "profile1010_YZ" through (0, 0, -12.7) normal (1, 0, 0) x (0, 1, 0)
ref_plane "profile1010_ZX" through (0, 0, -12.7) normal (0, 1, 0) x (0, 0, 1)
properties part number "1010_160mm"
